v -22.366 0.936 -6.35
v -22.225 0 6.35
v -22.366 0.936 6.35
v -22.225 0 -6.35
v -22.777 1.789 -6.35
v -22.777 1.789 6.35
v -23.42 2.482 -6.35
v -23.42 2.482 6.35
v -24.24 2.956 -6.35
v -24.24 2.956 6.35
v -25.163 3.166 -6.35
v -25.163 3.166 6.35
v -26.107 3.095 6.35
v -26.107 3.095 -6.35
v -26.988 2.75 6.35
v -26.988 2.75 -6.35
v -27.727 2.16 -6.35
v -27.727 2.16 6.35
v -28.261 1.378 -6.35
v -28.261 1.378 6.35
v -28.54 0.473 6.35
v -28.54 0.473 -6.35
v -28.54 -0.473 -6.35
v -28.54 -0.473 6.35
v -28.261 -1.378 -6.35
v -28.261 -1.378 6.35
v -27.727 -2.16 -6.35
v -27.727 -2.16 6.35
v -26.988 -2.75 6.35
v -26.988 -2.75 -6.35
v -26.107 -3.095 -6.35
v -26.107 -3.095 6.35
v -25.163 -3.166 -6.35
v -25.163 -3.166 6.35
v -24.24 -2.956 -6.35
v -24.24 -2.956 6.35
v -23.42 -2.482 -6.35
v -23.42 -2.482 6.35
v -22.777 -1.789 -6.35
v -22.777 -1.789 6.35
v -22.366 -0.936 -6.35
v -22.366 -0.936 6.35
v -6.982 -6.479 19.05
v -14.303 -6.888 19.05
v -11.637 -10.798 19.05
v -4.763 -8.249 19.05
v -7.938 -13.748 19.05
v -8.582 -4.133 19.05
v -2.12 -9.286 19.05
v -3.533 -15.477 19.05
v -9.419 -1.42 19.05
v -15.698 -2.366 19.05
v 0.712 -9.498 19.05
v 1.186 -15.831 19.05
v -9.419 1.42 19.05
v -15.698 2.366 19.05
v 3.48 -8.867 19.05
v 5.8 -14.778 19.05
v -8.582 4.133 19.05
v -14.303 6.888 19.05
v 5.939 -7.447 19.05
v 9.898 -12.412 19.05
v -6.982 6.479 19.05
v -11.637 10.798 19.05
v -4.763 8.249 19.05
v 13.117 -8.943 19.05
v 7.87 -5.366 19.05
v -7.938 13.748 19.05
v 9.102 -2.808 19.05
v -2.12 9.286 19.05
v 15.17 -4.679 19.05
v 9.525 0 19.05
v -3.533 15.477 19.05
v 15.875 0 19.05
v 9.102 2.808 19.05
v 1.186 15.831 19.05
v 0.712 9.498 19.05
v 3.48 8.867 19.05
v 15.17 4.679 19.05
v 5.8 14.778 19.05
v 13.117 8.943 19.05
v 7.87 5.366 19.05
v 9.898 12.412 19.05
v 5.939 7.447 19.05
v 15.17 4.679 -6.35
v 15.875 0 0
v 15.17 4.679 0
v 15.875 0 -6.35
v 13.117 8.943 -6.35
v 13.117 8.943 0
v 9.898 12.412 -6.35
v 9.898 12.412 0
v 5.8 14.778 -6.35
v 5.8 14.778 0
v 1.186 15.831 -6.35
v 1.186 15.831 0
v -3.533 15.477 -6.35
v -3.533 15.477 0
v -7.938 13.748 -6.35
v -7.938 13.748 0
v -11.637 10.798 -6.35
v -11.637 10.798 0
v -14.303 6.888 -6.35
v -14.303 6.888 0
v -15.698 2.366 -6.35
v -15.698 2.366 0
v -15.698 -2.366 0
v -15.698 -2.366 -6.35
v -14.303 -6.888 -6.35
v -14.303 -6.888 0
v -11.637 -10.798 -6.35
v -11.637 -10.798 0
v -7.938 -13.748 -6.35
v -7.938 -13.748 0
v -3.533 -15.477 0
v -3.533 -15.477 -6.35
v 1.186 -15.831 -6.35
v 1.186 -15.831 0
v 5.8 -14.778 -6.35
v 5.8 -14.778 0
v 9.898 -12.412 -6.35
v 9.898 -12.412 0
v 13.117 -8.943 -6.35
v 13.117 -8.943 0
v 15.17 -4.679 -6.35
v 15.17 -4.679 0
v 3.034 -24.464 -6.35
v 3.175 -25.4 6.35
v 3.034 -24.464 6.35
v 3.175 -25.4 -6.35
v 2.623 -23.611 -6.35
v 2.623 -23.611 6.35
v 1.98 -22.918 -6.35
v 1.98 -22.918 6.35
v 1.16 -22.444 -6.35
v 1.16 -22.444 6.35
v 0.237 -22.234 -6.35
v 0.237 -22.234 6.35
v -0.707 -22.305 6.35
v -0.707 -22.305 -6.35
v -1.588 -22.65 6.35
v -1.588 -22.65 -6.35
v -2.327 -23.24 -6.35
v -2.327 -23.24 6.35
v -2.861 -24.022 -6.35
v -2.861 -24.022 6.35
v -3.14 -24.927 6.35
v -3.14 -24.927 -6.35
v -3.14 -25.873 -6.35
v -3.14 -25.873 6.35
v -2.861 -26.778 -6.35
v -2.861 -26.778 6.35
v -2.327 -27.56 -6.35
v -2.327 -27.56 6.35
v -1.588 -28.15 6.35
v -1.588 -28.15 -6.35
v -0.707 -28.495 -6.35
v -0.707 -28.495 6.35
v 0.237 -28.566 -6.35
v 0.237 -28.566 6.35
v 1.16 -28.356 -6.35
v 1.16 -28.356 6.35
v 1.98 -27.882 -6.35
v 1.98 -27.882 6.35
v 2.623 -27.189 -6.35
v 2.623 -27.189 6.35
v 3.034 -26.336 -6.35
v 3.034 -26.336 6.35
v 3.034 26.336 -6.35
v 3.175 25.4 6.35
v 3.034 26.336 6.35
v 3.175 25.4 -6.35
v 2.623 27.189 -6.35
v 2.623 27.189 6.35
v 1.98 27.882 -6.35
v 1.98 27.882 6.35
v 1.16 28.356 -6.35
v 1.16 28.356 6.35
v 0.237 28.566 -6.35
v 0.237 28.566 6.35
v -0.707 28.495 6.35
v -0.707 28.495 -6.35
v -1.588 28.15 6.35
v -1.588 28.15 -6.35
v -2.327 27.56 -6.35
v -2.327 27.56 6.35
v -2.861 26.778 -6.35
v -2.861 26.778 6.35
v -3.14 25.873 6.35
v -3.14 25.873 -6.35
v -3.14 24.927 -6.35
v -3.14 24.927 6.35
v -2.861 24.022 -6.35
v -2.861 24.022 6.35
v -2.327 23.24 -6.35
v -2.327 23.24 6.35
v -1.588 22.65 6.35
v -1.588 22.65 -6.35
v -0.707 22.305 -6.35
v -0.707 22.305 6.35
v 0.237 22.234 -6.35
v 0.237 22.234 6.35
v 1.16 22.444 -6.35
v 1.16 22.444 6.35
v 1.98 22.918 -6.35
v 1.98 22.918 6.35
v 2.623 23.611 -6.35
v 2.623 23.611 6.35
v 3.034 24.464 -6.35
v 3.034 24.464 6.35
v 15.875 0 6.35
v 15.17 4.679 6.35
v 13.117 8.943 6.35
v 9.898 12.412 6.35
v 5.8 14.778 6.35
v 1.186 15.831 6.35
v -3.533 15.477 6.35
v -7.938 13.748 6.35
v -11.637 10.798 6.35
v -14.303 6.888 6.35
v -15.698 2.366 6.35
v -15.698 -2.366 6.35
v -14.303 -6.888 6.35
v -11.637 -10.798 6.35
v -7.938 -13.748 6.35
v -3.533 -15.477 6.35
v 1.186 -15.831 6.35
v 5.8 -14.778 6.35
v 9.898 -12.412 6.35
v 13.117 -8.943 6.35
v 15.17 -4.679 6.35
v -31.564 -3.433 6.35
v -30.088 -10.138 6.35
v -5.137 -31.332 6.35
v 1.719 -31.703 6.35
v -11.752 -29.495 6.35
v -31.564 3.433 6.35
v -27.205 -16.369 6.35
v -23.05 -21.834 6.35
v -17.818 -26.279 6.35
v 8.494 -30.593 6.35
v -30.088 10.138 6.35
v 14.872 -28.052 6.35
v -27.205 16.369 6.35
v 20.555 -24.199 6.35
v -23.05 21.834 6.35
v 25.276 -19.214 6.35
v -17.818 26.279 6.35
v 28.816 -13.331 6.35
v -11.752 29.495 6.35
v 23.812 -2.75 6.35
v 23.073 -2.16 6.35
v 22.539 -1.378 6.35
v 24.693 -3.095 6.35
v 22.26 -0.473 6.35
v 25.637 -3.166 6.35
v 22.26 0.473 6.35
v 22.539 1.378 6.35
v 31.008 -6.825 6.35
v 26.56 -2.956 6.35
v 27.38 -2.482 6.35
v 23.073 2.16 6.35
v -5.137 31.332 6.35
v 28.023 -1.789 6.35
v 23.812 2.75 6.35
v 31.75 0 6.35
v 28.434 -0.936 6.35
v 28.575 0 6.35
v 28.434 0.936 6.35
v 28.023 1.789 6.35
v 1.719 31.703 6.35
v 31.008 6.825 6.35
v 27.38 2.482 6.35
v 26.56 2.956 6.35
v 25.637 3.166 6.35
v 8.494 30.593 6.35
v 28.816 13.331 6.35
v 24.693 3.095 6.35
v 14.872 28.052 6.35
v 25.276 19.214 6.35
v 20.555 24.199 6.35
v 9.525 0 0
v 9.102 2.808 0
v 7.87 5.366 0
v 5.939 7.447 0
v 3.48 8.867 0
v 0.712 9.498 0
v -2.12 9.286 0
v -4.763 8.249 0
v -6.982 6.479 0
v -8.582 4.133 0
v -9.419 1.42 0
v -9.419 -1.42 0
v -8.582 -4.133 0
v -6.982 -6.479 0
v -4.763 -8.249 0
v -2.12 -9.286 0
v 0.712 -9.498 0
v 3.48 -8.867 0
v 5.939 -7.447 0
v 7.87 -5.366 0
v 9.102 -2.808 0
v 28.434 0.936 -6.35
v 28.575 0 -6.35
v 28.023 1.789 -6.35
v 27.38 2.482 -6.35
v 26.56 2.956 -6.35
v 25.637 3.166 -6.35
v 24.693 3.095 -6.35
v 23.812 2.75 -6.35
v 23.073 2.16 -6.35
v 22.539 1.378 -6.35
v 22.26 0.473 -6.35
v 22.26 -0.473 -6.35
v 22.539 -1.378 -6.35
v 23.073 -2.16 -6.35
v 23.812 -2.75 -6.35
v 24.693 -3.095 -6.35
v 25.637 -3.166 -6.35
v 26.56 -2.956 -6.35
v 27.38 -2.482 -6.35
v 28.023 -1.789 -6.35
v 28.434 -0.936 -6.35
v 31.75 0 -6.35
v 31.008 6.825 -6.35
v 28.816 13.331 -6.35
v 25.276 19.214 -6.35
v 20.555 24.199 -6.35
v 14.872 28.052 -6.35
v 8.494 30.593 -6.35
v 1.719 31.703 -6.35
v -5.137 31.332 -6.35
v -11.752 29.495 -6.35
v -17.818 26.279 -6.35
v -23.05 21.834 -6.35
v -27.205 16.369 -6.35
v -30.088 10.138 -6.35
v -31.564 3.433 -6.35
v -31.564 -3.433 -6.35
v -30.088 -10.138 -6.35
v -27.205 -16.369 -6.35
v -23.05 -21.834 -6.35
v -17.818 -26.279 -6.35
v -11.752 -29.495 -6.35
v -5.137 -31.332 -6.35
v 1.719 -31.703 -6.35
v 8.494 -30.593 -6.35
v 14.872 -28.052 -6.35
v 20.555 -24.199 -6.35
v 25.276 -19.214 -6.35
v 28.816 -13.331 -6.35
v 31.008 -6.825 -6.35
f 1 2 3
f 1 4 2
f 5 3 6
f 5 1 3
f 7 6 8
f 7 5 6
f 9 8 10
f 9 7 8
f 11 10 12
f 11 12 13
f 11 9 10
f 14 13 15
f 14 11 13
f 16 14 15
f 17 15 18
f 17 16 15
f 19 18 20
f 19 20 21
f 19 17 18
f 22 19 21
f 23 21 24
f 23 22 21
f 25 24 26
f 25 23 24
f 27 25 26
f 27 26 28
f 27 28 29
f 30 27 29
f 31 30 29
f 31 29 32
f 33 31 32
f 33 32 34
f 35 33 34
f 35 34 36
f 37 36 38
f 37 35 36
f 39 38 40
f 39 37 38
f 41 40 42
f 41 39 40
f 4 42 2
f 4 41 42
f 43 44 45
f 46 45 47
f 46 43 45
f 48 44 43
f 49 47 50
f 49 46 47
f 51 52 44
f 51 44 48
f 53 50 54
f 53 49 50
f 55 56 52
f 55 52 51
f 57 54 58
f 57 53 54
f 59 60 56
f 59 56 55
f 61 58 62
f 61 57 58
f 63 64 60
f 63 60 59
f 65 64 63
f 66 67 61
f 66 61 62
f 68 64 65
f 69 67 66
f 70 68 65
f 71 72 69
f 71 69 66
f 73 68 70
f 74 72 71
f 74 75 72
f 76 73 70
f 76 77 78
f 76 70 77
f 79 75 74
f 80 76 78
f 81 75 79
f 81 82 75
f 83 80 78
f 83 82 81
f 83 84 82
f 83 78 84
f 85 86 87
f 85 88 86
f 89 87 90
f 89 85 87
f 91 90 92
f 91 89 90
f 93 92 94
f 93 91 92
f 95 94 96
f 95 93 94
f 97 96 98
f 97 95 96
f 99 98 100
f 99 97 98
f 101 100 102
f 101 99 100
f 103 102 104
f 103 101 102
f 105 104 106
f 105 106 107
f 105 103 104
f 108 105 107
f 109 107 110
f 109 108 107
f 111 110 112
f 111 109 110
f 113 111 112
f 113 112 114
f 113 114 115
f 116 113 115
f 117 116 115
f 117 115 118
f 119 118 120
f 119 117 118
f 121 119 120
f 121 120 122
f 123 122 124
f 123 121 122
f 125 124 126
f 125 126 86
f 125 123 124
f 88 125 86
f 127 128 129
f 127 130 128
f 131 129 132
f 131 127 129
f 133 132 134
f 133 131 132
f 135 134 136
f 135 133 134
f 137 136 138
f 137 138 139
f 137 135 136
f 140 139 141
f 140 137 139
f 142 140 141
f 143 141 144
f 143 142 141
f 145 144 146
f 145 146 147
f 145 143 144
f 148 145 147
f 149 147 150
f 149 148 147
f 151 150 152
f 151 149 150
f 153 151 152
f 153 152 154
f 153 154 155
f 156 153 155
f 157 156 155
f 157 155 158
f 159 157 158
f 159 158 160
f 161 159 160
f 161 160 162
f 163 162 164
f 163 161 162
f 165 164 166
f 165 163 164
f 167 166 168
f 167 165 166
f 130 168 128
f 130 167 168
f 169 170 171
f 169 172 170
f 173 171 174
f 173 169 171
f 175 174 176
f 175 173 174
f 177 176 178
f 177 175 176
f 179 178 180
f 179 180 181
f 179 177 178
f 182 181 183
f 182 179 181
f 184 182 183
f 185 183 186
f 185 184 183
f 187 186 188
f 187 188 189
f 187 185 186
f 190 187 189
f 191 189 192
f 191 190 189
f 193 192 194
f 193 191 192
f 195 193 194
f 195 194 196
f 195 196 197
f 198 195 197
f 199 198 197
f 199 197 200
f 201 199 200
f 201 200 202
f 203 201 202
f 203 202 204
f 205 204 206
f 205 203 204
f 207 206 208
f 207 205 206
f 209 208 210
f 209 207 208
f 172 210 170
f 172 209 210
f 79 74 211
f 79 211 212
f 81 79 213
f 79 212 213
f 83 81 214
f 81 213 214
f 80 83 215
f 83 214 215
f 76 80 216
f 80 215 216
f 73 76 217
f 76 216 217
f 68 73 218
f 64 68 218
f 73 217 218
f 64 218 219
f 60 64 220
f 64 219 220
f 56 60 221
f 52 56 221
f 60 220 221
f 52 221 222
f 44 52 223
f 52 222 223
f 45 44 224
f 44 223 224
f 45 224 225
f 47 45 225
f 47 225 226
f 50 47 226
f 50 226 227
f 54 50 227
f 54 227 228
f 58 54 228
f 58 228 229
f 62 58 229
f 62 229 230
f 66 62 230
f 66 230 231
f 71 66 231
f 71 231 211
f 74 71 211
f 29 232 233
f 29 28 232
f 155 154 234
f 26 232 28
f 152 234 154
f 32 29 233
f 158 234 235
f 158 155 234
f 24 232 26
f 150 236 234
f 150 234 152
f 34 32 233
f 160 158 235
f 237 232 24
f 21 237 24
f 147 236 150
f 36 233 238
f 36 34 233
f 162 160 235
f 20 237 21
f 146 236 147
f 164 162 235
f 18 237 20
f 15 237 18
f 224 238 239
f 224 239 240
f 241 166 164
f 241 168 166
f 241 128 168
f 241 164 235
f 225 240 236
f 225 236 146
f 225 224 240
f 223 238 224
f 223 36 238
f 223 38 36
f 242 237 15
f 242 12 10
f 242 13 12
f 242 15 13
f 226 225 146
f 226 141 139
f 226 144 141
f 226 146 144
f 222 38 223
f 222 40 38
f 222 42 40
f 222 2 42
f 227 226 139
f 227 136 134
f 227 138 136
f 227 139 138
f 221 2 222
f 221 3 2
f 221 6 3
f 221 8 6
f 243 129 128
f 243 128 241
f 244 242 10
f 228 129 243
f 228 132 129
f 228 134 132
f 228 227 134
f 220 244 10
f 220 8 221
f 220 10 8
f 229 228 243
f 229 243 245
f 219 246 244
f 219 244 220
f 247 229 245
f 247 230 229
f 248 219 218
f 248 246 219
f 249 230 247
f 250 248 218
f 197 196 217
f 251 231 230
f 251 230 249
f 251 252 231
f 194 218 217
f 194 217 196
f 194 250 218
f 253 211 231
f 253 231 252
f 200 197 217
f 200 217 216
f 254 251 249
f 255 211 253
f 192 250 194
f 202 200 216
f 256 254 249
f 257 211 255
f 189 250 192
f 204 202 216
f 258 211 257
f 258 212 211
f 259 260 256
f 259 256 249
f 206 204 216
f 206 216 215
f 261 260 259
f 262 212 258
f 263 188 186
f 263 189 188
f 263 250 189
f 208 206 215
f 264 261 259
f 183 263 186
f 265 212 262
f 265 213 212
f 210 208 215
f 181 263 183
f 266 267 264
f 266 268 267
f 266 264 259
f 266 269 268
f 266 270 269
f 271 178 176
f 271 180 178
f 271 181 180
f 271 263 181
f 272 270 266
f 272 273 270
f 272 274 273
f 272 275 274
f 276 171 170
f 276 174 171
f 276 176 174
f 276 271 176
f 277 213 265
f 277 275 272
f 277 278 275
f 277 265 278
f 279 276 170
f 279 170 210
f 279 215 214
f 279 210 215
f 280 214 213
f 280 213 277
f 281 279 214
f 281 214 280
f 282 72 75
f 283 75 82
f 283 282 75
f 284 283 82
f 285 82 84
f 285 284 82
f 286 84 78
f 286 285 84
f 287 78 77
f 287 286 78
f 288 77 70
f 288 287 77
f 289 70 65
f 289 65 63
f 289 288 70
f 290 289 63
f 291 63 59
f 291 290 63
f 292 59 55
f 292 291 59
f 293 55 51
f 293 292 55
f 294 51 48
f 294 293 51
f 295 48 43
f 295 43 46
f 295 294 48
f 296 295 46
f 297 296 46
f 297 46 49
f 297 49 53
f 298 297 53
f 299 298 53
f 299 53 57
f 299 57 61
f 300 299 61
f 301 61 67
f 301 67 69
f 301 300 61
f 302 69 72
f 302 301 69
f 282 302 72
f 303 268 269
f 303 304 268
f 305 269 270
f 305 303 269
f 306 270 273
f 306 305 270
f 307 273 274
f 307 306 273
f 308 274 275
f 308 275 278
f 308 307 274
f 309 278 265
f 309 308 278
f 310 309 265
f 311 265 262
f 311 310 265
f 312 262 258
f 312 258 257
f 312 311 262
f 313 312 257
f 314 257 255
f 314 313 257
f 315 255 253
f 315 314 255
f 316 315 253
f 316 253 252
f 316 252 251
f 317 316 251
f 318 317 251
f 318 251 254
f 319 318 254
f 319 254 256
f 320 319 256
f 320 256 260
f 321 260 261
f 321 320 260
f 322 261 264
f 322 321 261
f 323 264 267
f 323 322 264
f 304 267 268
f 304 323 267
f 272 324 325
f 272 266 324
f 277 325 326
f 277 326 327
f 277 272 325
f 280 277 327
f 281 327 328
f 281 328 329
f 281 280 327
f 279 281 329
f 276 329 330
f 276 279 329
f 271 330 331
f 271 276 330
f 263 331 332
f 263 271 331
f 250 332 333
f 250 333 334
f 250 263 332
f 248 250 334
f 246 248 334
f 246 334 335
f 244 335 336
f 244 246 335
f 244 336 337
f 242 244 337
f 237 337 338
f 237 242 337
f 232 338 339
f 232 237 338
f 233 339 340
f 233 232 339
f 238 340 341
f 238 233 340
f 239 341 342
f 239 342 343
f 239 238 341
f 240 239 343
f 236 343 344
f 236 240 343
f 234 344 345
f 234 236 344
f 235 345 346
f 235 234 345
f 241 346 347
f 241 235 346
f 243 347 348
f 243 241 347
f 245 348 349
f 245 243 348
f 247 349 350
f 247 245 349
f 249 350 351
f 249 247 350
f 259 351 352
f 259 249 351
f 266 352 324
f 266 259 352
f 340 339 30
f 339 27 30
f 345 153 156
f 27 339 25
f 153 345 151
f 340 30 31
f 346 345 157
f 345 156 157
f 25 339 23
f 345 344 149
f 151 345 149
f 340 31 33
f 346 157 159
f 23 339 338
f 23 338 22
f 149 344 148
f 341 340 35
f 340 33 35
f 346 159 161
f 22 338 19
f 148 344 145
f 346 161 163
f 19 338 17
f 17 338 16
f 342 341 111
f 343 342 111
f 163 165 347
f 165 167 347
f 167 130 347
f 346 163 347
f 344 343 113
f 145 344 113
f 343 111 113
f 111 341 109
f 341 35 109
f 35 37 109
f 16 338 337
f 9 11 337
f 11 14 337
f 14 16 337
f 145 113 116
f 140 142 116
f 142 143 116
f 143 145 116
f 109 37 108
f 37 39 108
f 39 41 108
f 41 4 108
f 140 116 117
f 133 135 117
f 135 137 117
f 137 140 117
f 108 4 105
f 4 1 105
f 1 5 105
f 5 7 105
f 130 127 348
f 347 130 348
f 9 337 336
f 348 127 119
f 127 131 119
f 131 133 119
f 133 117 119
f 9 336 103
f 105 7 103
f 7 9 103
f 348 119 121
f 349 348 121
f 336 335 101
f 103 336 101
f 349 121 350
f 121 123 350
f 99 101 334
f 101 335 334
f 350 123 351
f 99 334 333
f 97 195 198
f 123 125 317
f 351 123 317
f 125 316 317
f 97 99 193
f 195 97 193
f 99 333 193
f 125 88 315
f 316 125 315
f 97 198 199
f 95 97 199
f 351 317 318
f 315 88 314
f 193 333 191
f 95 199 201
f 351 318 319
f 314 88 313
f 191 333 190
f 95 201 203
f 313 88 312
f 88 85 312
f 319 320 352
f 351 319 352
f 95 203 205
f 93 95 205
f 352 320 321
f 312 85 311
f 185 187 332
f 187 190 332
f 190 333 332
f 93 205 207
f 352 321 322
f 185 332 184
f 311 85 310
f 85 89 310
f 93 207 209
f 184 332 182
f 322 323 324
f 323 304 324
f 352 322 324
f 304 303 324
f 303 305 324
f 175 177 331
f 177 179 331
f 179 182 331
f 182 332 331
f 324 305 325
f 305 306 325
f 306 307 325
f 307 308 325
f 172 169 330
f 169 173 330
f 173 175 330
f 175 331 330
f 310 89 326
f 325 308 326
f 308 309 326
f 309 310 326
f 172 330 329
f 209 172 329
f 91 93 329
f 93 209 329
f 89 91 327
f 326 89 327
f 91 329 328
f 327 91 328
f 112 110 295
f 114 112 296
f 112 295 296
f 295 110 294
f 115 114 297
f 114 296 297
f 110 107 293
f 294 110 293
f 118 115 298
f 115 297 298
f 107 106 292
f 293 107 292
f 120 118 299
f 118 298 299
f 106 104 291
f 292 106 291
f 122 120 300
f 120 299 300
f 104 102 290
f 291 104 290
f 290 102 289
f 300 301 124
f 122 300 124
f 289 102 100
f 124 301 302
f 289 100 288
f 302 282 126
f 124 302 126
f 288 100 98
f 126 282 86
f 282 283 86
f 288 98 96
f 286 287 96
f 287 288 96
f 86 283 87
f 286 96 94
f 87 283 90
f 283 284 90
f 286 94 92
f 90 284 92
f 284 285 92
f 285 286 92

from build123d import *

# Parameters (mm, degrees)
F0_R     = 31.75
F0_R_2   = 3.175
F0_R_3   = 15.875
F1_DEPTH = 6.35
F0_R_4   = 9.525
F2_DEPTH = 19.05


with BuildPart() as f1:
    # F0 (on Top) → F1 (new body, symmetric)
    with BuildSketch(Plane.XY):
        Circle(F0_R)
        with Locations((0, -25.4)):
            Circle(F0_R_2, mode=Mode.SUBTRACT)
        with Locations((-25.4, 0)):
            Circle(F0_R_2, mode=Mode.SUBTRACT)
        Circle(F0_R_3, mode=Mode.SUBTRACT)
        with Locations((25.4, 0)):
            Circle(F0_R_2, mode=Mode.SUBTRACT)
        with Locations((0, 25.4)):
            Circle(F0_R_2, mode=Mode.SUBTRACT)
    extrude(amount=F1_DEPTH, both=True)

    # F0 (on Top) → F2 (join)
    with BuildSketch(Plane.XY):
        Circle(F0_R_3)
        Circle(F0_R_4, mode=Mode.SUBTRACT)
    extrude(amount=F2_DEPTH)


solid = f1.part
